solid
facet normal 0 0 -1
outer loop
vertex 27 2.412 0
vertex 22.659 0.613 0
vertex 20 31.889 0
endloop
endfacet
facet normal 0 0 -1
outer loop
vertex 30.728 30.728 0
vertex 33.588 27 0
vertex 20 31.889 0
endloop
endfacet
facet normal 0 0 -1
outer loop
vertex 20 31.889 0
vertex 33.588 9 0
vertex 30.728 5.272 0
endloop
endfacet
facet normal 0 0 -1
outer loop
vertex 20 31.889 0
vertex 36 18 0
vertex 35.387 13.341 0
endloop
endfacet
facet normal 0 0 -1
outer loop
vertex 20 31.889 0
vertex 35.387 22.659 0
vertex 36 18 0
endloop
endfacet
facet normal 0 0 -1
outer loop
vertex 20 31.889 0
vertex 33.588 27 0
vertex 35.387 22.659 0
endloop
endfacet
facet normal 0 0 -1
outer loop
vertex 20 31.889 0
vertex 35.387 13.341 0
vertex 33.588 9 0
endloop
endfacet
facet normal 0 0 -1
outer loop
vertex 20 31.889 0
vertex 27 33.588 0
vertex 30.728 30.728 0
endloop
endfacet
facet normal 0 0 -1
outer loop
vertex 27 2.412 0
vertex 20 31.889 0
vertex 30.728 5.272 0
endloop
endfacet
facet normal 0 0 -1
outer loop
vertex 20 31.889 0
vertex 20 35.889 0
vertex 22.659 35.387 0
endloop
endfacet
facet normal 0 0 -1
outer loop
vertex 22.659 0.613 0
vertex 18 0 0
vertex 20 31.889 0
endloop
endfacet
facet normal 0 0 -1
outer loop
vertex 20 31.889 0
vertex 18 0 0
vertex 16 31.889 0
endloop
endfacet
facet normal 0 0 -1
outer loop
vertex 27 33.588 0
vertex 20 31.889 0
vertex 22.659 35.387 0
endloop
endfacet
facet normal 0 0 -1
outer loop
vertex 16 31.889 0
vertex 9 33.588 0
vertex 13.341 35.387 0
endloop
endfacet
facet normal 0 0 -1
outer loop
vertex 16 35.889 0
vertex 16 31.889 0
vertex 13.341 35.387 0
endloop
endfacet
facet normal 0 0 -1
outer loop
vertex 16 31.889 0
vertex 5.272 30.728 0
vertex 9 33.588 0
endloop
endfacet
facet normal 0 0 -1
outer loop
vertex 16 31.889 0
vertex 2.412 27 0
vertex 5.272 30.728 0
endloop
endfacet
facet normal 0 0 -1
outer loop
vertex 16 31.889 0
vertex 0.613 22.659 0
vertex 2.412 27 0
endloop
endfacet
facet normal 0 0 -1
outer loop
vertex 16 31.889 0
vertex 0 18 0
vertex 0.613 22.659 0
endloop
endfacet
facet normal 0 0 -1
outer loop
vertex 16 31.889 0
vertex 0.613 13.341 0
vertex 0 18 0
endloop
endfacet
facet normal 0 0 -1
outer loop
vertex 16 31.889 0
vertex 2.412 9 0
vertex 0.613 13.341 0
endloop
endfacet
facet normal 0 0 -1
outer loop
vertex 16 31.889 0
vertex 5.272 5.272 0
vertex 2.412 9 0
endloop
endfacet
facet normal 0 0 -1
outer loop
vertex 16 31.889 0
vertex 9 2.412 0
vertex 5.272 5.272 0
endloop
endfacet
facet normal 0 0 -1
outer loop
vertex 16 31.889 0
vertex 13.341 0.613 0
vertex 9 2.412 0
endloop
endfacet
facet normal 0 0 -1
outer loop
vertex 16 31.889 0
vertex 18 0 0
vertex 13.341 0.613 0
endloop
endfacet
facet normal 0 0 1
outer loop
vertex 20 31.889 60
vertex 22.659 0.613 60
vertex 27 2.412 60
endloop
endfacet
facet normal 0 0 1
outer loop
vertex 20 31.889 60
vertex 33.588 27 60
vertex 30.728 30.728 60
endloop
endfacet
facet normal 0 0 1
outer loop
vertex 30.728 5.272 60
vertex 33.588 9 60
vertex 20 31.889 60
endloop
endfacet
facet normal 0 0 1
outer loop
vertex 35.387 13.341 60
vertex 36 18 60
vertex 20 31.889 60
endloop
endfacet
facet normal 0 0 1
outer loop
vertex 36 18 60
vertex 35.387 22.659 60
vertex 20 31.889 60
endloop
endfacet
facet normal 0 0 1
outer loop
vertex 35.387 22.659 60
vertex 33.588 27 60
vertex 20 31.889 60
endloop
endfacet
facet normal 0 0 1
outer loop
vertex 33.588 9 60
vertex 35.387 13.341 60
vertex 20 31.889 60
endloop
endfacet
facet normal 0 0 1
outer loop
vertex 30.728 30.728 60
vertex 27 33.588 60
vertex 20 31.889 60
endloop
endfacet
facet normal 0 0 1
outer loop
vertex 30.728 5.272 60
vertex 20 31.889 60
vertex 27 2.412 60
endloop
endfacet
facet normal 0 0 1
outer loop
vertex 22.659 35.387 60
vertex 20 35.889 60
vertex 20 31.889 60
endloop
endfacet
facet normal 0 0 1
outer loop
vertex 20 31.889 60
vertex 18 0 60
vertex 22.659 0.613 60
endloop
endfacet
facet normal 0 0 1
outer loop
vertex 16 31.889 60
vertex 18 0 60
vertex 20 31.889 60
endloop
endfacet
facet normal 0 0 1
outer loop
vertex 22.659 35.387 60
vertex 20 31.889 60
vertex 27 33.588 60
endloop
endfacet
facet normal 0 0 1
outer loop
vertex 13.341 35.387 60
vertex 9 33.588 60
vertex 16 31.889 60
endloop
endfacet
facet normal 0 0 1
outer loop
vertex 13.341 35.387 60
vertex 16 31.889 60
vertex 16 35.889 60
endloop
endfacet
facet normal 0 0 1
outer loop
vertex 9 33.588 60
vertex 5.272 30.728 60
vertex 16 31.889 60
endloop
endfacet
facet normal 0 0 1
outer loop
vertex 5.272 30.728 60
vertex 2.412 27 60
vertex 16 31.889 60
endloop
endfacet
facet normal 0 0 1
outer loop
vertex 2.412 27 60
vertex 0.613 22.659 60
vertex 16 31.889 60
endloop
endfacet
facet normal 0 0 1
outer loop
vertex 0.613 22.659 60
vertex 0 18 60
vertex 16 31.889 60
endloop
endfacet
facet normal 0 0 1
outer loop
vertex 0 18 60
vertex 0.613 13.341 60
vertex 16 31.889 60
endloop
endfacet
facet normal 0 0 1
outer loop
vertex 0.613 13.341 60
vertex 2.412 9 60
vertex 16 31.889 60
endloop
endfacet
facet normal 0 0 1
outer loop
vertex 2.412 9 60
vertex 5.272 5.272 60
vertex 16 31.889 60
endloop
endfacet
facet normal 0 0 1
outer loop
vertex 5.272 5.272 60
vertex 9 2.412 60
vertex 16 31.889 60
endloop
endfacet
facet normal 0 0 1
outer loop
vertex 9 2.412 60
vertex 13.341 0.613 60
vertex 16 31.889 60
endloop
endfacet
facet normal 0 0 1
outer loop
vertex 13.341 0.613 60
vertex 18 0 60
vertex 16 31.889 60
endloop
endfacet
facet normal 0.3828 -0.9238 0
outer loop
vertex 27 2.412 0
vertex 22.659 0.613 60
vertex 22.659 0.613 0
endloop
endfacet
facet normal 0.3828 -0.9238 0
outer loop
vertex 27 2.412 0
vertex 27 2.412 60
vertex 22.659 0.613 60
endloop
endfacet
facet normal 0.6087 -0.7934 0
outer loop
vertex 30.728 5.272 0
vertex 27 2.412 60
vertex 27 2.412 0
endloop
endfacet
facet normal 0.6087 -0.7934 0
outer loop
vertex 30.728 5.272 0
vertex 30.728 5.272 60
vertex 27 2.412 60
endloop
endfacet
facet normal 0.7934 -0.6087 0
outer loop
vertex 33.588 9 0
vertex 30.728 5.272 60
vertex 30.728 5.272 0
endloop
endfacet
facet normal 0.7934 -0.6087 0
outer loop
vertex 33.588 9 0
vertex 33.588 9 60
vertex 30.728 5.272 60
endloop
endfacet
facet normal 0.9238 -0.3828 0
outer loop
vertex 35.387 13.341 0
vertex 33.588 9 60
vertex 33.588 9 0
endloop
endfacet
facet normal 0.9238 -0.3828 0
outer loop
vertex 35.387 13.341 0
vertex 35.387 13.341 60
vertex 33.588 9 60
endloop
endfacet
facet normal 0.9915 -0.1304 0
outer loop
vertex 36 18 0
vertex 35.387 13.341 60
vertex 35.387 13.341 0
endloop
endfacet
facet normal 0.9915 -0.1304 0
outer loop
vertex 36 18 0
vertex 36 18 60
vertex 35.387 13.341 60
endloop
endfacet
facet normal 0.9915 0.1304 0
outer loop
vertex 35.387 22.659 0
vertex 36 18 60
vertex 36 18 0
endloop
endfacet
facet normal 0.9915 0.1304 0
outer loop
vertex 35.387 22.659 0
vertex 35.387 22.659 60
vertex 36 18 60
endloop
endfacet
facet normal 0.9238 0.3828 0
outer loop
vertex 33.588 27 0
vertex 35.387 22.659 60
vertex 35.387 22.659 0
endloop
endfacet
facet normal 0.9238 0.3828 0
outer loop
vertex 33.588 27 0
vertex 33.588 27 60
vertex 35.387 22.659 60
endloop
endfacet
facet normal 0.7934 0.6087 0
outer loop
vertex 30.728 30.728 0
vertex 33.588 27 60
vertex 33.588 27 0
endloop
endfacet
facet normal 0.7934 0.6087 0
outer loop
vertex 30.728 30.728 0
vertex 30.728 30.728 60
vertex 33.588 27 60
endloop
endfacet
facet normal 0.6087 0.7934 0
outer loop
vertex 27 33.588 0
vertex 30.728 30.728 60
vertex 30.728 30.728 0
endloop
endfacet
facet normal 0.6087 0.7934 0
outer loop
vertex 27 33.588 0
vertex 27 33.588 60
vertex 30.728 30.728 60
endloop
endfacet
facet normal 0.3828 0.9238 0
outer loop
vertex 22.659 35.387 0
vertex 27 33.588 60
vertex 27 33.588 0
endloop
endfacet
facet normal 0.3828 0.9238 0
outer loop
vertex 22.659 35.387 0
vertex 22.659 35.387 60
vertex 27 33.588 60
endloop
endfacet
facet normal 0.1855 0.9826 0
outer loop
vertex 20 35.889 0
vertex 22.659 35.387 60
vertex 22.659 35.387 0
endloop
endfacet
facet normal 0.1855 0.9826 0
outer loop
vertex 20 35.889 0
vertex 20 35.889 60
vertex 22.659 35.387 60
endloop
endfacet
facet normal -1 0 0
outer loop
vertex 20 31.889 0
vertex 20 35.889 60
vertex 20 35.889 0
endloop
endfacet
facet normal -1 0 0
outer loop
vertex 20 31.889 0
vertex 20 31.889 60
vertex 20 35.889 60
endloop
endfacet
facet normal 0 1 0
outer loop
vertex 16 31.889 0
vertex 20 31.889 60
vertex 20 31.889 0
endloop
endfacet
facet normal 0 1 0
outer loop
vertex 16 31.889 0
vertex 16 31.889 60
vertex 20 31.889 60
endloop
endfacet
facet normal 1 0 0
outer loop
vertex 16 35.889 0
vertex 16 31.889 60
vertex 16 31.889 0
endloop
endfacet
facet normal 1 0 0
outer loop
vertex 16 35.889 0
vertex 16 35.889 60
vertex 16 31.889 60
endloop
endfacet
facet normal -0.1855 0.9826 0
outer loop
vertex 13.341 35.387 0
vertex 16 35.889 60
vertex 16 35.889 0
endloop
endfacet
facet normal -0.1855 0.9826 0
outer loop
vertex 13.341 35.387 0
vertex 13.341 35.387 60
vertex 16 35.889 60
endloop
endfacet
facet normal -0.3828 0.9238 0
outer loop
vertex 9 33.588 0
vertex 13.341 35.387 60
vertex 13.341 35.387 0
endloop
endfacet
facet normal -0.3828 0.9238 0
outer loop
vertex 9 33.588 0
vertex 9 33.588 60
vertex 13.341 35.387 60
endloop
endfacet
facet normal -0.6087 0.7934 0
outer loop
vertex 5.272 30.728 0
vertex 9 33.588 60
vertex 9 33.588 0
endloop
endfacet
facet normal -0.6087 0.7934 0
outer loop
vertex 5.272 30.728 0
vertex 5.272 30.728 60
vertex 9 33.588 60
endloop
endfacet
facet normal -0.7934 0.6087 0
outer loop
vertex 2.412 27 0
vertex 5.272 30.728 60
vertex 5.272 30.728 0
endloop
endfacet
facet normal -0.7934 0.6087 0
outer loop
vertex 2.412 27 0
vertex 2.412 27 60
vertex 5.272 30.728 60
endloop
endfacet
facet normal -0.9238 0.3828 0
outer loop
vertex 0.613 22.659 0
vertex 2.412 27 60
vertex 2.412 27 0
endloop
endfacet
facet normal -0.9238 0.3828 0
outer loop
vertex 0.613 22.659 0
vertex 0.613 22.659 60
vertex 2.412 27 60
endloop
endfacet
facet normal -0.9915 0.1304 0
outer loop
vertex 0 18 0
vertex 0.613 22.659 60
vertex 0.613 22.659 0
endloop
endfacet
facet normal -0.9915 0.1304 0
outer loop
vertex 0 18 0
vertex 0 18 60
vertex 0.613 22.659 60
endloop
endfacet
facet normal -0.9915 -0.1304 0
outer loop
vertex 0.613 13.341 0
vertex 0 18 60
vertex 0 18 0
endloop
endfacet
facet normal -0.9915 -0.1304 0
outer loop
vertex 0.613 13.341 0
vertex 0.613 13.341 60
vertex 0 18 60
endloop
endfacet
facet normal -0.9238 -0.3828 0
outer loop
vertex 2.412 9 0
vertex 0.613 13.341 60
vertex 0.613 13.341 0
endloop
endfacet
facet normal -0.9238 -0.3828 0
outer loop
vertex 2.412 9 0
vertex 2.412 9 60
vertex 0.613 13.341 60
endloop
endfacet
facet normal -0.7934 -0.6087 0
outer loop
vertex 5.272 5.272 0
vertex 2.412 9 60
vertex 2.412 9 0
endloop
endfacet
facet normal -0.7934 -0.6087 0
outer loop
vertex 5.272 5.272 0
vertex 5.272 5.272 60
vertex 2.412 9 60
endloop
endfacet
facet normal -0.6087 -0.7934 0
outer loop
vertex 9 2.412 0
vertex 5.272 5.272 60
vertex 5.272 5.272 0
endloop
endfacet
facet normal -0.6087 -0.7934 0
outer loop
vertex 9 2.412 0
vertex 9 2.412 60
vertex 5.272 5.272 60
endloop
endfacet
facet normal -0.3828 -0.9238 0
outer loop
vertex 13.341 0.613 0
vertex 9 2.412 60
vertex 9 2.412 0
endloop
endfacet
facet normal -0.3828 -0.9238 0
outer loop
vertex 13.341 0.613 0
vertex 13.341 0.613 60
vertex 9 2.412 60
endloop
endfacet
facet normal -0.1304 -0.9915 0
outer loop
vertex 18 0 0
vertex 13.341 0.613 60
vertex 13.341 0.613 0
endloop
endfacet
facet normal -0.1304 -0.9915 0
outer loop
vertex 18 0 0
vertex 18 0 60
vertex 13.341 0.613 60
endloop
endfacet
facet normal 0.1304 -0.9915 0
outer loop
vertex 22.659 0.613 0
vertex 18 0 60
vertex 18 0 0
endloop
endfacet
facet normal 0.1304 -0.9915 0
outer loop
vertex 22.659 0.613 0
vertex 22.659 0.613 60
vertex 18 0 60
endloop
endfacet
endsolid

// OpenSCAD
$fn = 32;

// ----------------------------------------------------------------------
// Keyway shaft: d36 shaft, key 4 x 4 mm
// ----------------------------------------------------------------------

// --- parameters (mm) ---
shaft_r = 18;             // shaft radius
key_w = 4;                // keyway width
key_d = 4;                // keyway depth below the surface line
plate_t = 60;             // shaft length, Z (extrusion height)

shaft_d = 2 * shaft_r;  // shaft diameter
circle_step = 15;  // polygon sampling step, degrees

profile = [[13.341, 35.387], [9, 33.588], [5.272, 30.728], [2.412, 27], [0.613, 22.659], [0, 18], [0.613, 13.341], [2.412, 9], [5.272, 5.272], [9, 2.412], [13.341, 0.613], [18, 0], [22.659, 0.613], [27, 2.412], [30.728, 5.272], [33.588, 9], [35.387, 13.341], [36, 18], [35.387, 22.659], [33.588, 27], [30.728, 30.728], [27, 33.588], [22.659, 35.387], [20, 35.889], [20, 31.889], [16, 31.889], [16, 35.889]];  // primary outline, 27 points, counter clockwise

// --- the one profile operation ---
linear_extrude(height = plate_t) polygon(points = profile);
